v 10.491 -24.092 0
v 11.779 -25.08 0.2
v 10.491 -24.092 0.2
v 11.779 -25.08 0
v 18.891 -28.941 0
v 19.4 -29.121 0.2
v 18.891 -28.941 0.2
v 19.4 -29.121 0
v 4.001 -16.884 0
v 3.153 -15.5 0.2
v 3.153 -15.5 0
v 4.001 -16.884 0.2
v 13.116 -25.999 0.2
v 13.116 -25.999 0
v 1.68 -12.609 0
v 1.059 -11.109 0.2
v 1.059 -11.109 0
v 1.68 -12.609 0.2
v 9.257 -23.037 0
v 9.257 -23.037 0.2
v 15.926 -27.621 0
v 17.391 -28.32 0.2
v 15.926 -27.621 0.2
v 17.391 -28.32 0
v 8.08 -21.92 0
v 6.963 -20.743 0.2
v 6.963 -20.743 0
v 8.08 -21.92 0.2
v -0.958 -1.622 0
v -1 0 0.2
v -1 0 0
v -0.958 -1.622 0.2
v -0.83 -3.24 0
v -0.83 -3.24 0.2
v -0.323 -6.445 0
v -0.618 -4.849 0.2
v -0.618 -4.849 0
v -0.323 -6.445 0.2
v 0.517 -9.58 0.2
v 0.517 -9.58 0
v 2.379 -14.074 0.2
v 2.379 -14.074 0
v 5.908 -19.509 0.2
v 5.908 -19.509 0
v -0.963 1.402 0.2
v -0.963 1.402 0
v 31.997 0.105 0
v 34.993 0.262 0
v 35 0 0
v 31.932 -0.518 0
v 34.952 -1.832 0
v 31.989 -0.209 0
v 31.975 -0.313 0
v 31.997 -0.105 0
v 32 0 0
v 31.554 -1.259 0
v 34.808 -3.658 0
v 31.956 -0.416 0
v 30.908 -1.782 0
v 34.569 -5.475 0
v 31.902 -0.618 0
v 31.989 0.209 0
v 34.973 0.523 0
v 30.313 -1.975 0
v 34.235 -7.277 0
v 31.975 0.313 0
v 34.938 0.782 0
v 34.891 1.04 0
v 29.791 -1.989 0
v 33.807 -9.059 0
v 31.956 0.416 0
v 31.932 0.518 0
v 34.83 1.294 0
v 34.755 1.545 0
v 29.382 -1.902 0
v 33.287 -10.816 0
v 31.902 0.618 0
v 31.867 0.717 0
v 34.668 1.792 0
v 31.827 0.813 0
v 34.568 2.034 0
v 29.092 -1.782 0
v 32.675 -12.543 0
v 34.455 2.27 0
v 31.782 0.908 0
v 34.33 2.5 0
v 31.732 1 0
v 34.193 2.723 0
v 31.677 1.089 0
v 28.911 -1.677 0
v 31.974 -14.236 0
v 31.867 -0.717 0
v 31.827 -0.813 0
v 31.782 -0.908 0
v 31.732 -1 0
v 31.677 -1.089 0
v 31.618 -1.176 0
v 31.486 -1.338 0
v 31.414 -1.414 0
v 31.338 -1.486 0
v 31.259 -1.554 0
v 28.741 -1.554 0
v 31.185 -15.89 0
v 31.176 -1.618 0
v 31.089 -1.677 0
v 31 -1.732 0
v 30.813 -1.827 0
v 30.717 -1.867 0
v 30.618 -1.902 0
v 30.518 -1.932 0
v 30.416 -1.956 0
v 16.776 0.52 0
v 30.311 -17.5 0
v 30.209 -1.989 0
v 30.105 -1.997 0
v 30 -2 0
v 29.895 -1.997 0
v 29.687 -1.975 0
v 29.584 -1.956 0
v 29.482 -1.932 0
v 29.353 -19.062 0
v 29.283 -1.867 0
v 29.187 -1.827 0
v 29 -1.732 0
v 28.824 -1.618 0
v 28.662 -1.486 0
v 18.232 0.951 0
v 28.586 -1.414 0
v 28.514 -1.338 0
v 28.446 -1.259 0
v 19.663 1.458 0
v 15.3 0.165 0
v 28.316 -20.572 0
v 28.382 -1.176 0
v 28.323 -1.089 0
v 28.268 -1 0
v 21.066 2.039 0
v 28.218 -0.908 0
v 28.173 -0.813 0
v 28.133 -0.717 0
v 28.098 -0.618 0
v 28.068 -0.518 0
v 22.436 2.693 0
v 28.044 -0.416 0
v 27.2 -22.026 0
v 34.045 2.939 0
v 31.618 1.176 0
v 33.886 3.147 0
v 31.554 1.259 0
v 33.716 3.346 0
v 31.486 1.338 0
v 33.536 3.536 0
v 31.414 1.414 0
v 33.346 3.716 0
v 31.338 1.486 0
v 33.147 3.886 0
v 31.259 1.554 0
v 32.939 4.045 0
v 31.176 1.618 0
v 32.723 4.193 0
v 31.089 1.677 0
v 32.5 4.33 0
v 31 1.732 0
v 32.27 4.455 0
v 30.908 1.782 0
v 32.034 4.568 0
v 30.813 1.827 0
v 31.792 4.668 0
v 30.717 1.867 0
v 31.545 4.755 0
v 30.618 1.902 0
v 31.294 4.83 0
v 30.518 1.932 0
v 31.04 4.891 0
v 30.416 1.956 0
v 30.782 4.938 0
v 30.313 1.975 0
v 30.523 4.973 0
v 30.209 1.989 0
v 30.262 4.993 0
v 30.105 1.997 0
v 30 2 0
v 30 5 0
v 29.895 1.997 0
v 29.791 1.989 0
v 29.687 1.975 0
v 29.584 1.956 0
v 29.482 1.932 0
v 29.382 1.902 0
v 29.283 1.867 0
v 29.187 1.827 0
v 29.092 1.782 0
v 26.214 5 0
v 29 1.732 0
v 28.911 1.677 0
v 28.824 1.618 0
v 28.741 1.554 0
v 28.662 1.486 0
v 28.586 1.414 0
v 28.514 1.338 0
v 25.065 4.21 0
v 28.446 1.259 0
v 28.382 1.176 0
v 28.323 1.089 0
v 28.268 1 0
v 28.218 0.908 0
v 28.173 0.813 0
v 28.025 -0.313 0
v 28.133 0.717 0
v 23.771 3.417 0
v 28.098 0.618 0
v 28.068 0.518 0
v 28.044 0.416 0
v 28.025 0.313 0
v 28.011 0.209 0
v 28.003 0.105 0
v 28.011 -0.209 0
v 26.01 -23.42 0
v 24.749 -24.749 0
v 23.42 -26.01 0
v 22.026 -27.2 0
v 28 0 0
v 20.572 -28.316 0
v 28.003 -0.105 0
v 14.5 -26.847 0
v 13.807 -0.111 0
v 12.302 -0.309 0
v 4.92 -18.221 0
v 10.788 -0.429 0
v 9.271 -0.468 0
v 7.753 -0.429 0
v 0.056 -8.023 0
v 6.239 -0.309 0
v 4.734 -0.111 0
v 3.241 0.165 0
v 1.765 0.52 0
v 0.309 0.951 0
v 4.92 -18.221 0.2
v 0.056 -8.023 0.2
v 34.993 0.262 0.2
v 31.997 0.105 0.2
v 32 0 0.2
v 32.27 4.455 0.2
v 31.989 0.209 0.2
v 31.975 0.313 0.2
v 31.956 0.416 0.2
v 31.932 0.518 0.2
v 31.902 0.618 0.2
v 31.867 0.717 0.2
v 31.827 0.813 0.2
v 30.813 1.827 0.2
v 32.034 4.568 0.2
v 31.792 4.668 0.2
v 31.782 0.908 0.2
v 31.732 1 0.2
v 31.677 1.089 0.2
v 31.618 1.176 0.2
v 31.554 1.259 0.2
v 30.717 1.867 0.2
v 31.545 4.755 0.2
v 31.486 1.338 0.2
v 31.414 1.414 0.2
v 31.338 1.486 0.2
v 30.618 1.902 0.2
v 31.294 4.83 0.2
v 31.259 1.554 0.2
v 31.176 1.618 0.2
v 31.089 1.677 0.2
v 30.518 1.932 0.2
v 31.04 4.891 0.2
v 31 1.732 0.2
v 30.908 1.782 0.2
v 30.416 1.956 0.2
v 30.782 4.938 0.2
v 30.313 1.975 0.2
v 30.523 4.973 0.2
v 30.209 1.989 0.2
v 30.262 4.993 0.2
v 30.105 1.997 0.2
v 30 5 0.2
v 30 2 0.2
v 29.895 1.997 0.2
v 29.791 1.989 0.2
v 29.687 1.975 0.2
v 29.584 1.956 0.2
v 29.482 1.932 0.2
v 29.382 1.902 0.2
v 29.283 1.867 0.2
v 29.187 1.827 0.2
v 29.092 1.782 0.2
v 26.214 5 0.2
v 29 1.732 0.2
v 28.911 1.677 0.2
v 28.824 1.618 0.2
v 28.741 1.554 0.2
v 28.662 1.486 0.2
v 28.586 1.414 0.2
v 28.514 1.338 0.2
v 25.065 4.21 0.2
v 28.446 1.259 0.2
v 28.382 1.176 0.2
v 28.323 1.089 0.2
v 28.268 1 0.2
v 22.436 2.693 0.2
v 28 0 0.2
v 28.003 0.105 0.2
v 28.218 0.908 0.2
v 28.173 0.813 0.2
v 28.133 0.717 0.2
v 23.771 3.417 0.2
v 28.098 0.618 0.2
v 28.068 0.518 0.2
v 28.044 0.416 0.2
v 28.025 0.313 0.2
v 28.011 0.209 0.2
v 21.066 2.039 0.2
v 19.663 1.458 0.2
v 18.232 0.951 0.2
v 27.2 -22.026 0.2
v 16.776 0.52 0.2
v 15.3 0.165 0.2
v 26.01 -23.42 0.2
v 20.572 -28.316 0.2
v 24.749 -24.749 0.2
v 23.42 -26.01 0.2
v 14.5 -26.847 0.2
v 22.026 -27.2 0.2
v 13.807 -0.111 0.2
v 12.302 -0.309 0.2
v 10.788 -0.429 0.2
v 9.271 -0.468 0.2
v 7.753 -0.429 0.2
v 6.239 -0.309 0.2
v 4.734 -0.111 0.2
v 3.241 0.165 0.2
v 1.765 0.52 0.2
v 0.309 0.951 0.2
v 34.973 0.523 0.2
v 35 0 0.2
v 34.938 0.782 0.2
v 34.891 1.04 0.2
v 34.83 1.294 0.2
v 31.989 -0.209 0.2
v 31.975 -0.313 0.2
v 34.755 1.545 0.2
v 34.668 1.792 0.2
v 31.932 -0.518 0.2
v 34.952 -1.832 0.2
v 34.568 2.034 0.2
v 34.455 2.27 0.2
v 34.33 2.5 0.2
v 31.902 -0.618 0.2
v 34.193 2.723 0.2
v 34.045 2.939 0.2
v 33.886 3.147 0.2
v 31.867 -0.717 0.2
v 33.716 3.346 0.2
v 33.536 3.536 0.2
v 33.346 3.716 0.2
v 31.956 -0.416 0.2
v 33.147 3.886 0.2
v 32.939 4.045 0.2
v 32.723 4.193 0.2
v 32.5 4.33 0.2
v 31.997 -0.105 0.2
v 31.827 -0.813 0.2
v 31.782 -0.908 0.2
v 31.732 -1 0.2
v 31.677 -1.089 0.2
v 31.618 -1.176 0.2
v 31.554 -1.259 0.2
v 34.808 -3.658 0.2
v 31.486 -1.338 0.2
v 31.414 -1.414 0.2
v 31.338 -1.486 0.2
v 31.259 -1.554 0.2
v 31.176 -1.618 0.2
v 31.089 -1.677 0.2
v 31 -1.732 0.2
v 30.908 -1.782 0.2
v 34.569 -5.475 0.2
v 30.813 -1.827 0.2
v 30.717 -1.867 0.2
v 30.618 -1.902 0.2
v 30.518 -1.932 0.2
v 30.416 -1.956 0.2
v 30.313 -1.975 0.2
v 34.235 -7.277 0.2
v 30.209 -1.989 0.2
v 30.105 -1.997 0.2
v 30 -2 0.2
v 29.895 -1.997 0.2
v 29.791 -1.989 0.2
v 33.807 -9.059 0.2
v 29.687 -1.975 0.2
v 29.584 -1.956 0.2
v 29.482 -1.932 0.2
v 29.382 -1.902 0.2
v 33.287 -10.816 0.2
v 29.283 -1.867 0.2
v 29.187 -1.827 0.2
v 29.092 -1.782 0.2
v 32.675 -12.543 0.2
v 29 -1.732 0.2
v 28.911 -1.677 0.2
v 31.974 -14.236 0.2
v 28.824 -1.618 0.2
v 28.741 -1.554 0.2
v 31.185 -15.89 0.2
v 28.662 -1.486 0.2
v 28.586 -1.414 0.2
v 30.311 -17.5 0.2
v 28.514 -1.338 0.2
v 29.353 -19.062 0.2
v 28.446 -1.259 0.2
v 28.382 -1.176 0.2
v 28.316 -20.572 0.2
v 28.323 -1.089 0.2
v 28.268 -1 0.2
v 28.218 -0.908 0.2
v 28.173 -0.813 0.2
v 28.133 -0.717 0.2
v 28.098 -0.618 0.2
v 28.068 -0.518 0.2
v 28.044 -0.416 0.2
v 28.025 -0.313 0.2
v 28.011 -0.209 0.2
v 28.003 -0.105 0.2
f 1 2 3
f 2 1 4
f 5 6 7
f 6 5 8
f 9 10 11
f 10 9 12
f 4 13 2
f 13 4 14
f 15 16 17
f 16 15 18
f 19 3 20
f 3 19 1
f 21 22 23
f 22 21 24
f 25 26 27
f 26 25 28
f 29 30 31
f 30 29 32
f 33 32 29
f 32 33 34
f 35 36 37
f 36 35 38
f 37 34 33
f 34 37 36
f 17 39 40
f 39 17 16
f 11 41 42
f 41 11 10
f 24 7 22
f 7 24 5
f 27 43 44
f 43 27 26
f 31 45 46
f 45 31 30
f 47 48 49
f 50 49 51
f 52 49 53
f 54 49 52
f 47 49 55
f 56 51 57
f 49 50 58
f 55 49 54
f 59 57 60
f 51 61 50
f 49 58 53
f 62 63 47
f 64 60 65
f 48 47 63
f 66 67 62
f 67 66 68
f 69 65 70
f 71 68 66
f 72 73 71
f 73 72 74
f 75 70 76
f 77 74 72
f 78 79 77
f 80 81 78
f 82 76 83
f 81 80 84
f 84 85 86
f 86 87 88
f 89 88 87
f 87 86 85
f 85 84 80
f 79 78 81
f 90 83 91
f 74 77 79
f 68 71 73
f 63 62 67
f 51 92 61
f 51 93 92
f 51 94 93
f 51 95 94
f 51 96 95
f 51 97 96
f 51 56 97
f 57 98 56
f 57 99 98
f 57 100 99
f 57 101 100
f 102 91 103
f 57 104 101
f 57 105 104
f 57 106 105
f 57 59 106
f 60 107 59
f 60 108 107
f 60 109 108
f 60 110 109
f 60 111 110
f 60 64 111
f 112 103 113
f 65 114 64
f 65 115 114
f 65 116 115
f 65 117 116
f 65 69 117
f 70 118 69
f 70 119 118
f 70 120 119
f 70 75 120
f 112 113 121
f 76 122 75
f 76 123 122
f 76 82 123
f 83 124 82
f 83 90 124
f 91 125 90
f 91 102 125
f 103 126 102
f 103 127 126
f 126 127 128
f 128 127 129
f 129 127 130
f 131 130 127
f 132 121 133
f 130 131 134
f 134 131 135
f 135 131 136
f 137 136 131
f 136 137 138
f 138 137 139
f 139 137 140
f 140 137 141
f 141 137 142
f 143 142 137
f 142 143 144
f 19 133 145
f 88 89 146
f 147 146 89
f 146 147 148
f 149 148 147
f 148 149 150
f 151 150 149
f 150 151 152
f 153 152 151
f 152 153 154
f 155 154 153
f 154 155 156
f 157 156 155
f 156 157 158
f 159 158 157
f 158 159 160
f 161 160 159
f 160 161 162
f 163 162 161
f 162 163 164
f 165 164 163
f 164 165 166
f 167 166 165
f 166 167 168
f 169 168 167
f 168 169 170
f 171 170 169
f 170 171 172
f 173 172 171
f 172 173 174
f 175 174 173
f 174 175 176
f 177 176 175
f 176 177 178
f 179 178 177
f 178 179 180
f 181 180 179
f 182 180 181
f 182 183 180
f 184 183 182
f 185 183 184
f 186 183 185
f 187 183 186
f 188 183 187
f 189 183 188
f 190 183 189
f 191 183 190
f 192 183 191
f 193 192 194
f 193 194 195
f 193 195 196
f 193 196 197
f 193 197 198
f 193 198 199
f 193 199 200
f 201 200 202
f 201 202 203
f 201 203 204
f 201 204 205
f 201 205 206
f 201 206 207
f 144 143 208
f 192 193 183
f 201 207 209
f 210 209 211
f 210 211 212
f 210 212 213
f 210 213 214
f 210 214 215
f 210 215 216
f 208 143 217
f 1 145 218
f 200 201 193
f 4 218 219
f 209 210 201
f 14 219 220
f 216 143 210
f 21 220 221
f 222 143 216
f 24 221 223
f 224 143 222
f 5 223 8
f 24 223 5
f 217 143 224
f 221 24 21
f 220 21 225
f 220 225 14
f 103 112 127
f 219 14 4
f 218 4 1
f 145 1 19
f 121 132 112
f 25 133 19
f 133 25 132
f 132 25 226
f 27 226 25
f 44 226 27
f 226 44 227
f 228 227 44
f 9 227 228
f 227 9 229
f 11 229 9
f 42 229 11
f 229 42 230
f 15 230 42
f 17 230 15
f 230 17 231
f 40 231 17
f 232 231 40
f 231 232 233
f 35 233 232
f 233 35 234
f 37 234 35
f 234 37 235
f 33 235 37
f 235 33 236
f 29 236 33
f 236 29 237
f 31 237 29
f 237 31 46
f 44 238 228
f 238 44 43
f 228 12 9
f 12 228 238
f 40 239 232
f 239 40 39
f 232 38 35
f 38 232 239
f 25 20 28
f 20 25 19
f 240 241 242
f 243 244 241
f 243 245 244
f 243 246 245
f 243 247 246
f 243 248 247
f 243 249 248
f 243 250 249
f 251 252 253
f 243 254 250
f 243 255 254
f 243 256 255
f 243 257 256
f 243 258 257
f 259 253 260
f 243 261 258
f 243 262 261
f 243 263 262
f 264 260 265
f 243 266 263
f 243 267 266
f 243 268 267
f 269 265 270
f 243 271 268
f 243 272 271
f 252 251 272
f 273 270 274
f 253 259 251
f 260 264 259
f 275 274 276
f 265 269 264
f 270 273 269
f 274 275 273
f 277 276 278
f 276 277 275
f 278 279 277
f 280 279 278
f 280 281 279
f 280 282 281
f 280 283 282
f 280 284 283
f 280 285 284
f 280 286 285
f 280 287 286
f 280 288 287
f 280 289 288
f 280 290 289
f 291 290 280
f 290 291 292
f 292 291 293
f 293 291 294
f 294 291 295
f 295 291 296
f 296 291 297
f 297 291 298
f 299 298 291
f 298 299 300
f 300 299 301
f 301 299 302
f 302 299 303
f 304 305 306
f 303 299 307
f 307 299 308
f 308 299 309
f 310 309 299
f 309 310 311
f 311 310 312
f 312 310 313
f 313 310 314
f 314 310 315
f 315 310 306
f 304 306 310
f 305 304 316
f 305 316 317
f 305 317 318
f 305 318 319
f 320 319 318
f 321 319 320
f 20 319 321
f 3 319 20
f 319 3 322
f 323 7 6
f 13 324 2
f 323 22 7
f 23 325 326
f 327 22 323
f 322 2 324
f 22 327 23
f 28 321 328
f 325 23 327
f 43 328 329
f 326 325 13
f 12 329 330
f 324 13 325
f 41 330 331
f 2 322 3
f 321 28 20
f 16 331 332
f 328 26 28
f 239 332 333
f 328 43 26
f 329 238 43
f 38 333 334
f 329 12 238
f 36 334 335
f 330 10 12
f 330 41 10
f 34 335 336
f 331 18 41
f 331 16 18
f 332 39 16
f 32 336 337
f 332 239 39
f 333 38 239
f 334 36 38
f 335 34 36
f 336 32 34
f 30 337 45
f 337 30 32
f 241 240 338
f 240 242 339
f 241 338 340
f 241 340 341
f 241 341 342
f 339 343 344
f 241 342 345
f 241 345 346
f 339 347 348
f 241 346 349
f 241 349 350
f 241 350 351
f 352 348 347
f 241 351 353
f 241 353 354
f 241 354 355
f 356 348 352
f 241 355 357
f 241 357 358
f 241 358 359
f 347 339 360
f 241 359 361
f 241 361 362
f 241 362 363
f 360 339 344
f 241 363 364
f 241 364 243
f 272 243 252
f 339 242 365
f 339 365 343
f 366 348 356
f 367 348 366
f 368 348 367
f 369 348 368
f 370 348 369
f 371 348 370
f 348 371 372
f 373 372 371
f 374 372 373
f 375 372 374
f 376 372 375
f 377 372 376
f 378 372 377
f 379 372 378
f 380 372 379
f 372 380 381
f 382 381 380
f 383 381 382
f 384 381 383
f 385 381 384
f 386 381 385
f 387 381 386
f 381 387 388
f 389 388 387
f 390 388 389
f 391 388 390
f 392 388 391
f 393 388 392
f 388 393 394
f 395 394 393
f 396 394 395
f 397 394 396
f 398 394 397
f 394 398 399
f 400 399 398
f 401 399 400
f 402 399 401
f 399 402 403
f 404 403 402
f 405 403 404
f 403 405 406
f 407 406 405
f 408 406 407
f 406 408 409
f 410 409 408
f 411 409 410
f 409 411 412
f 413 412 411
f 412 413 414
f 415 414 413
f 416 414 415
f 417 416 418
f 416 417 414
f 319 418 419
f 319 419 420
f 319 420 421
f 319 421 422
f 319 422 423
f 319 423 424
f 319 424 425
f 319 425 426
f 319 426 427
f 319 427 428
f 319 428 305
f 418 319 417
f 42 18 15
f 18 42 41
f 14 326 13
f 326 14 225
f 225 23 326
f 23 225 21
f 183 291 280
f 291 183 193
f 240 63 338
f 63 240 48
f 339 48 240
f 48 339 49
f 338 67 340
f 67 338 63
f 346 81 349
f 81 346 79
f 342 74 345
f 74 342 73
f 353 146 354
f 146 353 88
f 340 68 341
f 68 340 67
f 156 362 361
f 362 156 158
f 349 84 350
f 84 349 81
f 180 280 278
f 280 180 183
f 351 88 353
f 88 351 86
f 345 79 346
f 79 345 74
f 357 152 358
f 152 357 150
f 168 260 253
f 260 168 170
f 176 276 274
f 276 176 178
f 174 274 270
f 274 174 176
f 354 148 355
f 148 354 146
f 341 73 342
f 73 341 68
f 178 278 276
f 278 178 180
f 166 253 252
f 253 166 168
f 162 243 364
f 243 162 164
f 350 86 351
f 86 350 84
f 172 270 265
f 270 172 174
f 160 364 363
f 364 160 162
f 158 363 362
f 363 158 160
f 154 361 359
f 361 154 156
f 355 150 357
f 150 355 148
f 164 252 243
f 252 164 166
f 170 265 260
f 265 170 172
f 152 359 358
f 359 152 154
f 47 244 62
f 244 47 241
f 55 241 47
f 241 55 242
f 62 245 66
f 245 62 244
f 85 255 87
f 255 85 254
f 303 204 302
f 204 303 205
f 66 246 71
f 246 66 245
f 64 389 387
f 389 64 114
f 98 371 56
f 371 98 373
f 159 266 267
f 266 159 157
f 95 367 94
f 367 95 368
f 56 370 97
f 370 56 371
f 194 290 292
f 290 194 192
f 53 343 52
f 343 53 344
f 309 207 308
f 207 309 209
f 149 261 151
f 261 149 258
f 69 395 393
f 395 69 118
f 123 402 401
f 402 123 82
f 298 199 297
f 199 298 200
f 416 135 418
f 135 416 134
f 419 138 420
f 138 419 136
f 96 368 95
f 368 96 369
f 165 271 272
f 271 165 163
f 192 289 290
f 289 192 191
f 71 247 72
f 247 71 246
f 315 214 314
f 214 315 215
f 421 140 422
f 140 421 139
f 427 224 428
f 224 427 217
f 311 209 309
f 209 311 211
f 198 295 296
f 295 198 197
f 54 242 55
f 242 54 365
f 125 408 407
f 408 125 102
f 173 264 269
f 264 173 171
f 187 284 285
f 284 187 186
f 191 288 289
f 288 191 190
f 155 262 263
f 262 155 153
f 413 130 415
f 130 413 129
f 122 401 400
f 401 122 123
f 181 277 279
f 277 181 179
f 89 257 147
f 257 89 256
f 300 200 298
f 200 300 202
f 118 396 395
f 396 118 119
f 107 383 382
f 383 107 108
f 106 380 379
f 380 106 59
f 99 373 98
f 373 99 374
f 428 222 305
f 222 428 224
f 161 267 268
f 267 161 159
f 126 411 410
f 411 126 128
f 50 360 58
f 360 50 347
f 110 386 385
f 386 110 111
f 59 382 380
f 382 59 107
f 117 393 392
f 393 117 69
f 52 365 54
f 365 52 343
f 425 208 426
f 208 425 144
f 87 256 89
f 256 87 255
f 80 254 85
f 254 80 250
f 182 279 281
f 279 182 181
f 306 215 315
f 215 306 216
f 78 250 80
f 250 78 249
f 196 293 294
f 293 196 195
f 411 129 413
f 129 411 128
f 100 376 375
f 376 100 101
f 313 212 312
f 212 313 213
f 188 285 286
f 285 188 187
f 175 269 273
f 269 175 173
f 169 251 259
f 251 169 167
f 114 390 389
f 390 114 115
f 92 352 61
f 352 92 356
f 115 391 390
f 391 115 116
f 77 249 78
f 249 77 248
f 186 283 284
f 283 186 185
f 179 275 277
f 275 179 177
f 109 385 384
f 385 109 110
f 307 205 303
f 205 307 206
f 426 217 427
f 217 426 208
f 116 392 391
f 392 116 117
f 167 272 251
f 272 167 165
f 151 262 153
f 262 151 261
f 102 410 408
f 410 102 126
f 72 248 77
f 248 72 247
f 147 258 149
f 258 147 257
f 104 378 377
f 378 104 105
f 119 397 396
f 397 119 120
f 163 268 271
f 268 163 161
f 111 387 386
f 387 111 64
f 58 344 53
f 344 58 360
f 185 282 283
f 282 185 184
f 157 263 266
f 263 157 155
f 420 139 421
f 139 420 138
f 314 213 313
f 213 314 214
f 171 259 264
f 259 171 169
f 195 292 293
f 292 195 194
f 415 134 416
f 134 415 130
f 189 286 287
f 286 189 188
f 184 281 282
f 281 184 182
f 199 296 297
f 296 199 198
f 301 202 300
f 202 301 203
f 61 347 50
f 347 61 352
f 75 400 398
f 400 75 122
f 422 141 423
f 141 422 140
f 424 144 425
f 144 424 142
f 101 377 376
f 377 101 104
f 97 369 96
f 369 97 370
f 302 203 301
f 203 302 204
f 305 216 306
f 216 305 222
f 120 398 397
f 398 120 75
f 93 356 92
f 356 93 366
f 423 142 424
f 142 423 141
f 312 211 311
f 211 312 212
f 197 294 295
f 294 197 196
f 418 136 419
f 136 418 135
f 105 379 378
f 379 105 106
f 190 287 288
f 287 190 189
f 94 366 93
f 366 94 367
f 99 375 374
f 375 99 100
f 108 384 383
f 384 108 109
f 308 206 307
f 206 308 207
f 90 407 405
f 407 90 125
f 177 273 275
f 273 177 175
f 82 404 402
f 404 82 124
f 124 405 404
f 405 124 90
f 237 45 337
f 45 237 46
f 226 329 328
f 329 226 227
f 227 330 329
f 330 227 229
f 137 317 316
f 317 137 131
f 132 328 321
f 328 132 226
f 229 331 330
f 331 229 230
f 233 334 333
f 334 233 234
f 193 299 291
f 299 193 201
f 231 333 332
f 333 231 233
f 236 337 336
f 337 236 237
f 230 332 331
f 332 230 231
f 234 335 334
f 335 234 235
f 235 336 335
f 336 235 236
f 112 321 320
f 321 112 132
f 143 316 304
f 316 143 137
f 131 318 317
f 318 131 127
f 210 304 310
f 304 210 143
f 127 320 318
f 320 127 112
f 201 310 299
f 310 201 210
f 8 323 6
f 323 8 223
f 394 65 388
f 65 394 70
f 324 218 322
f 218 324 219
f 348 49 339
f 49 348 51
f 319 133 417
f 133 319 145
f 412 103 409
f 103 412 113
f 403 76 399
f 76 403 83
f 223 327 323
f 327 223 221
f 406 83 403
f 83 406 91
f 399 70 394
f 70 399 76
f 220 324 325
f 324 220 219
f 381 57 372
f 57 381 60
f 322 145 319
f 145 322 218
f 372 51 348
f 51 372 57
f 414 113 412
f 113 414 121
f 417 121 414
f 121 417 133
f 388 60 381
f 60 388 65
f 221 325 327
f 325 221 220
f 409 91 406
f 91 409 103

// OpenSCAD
$fn = 120;



vNoOfBlades = 5;
vAngleIncrement = 360/vNoOfBlades;

vBladeThickness = 0.2;
vBladeOverlap = 2;
vBladeAxis_d = 4;
vBladeAxisEye = 10;
vBladeAxisCircle = 60;
vBladeBase_d = vBladeAxisCircle;
vBladeBase_d1 = vBladeAxisCircle+vBladeOverlap;
vBladeBase_d2 = vBladeAxisCircle-vBladeOverlap;
vBladeOuter_d = vBladeAxisCircle + vBladeAxisEye;


vBladeOffset = vBladeAxisCircle/2;



intersection(){
    difference(){
        union(){
            // base half circle
            difference(){
                translate([vBladeOffset, 0, 0])
                    //cylinder(d=vBladeBase_d, h=vBladeThickness);
                    cylinder(d=vBladeBase_d1, h=vBladeThickness);
                translate([vBladeAxisEye,0,0])
                    cube([vBladeBase_d, vBladeBase_d/2, vBladeThickness]);
                }
            // adding a bit to the half circle
            translate([vBladeAxisEye,0,0])
                cube([vBladeBase_d/2-vBladeAxisEye, vBladeAxisEye/2, vBladeThickness]);
            // adding the final axis eye
            translate([vBladeOffset, 0, 0])
                cylinder(d=vBladeAxisEye, h=vBladeThickness);
            }
        // axis hole
        translate([vBladeOffset, 0, 0])
            cylinder(d=vBladeAxis_d, h=vBladeThickness);
        
        // cutoff from next blade
        rotate([0,0, vAngleIncrement])
            translate([vBladeOffset, 0, 0])
                //cylinder(d=vBladeBase_d, h=vBladeThickness);
                cylinder(d=vBladeBase_d2, h=vBladeThickness);
        
    }
    cylinder(d=vBladeOuter_d, h=vBladeThickness);
}
